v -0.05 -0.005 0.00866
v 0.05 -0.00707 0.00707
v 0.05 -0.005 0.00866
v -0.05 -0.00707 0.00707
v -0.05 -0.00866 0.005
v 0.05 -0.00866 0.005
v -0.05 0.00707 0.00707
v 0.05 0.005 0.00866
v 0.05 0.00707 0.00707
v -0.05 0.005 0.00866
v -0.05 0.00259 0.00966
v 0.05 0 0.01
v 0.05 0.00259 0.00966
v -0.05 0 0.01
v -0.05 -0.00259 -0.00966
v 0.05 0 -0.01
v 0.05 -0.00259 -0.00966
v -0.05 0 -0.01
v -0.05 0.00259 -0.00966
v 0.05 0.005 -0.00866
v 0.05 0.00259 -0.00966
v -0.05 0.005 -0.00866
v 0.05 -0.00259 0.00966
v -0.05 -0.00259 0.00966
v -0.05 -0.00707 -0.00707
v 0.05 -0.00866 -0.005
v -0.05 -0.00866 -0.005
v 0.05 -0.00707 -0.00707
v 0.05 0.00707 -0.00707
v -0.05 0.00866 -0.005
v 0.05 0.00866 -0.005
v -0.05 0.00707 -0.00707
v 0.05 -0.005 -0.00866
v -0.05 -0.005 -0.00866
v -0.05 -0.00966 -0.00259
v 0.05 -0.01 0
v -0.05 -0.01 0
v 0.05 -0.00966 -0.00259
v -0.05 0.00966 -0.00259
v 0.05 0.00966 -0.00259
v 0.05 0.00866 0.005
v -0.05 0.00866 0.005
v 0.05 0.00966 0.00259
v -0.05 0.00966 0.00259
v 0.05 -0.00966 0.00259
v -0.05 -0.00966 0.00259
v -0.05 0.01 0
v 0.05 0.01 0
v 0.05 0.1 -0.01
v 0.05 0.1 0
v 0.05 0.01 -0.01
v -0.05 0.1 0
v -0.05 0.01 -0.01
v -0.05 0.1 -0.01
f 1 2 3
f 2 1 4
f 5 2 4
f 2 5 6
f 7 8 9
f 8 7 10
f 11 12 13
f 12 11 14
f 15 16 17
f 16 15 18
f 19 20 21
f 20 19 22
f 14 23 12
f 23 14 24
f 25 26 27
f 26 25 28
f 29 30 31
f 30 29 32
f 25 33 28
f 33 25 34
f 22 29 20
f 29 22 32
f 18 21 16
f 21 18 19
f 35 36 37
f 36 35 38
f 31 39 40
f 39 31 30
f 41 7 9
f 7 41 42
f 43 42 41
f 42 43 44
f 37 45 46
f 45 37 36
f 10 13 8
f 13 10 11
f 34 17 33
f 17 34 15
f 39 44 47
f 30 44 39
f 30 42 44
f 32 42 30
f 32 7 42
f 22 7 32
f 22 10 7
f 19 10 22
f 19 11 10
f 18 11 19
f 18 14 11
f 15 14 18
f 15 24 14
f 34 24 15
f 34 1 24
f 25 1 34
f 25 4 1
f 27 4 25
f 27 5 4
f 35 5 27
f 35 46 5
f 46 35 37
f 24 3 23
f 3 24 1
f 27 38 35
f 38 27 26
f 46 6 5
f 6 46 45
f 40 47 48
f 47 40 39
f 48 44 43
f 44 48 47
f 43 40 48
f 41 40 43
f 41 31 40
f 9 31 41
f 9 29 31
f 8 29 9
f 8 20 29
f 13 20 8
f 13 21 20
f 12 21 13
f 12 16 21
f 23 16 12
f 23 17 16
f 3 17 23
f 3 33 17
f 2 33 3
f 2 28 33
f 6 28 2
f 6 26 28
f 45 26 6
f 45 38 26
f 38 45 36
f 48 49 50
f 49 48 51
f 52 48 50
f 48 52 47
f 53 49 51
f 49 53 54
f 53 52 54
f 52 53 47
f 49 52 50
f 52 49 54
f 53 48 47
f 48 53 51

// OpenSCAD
// HingeMesh.CreateMount / HingeMath: width=.10, depth=.10, thickness=.01, pin radius=.01 m; 24 segments. Unity Y is vertical.
$fn=24; color("#8E9296") { translate([-.05,0,0]) rotate([0,90,0]) cylinder(r=.01,h=.10); translate([-.05,.01,-.01]) cube([.10,.09,.01]); }
